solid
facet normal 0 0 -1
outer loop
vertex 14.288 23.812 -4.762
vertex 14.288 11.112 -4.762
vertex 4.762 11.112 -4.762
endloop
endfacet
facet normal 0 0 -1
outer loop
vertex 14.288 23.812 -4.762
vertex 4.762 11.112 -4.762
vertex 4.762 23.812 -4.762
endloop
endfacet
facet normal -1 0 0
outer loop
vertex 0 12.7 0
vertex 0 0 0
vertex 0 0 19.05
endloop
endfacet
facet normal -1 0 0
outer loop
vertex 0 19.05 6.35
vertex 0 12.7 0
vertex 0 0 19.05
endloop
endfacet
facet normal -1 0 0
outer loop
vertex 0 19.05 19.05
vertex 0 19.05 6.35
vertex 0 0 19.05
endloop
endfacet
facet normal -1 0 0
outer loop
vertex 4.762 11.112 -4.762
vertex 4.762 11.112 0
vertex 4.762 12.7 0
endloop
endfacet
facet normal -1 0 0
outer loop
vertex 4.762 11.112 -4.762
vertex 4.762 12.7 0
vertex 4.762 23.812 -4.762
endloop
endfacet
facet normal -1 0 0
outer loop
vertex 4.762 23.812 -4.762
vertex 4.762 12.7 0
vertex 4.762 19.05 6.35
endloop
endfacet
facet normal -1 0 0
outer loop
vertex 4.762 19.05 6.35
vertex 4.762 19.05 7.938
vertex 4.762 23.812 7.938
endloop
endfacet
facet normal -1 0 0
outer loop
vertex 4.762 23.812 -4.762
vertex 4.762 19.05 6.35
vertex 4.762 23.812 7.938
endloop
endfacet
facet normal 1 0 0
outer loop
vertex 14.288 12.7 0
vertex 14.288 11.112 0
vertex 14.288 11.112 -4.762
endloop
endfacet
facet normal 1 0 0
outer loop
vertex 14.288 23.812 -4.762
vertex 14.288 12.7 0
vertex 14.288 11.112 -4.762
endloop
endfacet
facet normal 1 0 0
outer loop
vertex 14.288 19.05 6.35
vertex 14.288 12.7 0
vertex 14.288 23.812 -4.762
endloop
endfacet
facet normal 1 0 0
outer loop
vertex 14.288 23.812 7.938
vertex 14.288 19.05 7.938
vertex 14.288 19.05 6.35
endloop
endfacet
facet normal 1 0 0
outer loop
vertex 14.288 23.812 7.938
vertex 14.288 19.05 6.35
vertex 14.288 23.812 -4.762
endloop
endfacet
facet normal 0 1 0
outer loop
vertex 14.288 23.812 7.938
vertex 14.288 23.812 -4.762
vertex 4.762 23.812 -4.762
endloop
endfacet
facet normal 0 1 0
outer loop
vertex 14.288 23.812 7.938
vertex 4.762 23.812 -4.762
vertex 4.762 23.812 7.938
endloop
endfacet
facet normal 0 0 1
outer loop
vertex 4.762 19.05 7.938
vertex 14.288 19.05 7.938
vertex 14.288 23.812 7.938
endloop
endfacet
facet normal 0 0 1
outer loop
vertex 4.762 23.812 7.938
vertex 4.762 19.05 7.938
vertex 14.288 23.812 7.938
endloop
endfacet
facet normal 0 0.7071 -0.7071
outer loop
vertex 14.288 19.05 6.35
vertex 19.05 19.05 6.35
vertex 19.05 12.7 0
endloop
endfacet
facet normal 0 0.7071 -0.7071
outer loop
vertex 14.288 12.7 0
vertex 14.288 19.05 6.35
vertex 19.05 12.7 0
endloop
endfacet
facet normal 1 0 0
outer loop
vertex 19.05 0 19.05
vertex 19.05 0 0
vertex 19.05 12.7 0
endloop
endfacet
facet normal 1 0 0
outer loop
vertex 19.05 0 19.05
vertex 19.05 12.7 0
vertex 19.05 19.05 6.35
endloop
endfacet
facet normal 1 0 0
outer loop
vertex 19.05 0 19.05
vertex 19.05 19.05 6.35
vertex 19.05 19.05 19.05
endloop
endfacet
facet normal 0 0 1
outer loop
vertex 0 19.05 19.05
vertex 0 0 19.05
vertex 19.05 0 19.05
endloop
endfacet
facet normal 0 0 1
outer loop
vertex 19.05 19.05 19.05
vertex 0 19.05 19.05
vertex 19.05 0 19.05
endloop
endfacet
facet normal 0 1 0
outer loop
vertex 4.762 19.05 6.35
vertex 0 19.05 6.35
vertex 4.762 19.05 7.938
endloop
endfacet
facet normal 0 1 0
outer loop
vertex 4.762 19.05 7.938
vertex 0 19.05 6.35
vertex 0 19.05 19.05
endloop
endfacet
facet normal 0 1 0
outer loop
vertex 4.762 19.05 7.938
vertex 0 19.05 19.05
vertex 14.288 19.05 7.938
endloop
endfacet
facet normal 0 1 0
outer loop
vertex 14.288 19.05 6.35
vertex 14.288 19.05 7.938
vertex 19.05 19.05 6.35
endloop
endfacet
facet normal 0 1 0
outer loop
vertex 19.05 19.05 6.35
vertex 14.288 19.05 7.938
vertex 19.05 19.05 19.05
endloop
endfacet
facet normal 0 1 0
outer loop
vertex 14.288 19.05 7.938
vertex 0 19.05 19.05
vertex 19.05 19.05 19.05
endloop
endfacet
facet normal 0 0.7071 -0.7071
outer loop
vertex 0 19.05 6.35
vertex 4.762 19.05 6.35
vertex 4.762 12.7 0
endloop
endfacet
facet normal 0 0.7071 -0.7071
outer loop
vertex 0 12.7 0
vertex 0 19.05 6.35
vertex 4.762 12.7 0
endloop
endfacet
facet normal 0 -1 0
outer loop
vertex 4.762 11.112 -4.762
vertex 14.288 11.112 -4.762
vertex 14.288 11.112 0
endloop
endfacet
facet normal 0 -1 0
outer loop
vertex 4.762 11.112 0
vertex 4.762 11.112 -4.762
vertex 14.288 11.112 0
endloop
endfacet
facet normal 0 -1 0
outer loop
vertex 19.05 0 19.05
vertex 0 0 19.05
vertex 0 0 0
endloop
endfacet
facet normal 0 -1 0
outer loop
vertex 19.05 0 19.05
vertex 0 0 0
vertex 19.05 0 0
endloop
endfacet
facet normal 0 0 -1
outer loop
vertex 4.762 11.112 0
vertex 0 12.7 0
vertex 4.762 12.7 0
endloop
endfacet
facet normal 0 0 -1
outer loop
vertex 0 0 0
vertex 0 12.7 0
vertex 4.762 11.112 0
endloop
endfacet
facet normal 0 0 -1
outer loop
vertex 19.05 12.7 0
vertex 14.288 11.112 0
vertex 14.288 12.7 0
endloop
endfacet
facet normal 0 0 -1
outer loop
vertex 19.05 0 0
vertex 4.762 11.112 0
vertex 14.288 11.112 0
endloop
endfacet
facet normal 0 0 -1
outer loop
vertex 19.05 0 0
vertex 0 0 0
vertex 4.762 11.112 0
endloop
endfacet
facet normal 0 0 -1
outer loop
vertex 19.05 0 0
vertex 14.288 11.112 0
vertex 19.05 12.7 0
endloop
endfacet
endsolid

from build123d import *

# Parameters (mm, degrees)
F0_W     = 19.05
F0_H     = 19.05
F1_DEPTH = 19.05
F4_DEPTH = 19.05
F5_W     = 12.7
F5_H     = 12.7
F6_DEPTH = 4.7625


with BuildPart() as f1:
    # F0 (on Front) → F1 (new body)
    with BuildSketch(Plane.XZ):
        with Locations((9.525, 9.525)):
            Rectangle(F0_W, F0_H)
    extrude(amount=-F1_DEPTH)

    # F3 (on face) → F4 (cut)
    with BuildSketch(Plane.YZ.offset(19.05)):
        Polygon((19.05, 6.35), (12.7, 0), (19.05, 0), align=None)
    extrude(amount=-F4_DEPTH, mode=Mode.SUBTRACT)

    # F5 (on offset) → F6 (join, symmetric)
    with BuildSketch(Plane.YZ.offset(9.525)):
        with Locations((17.4625, 1.5875)):
            Rectangle(F5_W, F5_H)
    extrude(amount=F6_DEPTH, both=True)


solid = f1.part
